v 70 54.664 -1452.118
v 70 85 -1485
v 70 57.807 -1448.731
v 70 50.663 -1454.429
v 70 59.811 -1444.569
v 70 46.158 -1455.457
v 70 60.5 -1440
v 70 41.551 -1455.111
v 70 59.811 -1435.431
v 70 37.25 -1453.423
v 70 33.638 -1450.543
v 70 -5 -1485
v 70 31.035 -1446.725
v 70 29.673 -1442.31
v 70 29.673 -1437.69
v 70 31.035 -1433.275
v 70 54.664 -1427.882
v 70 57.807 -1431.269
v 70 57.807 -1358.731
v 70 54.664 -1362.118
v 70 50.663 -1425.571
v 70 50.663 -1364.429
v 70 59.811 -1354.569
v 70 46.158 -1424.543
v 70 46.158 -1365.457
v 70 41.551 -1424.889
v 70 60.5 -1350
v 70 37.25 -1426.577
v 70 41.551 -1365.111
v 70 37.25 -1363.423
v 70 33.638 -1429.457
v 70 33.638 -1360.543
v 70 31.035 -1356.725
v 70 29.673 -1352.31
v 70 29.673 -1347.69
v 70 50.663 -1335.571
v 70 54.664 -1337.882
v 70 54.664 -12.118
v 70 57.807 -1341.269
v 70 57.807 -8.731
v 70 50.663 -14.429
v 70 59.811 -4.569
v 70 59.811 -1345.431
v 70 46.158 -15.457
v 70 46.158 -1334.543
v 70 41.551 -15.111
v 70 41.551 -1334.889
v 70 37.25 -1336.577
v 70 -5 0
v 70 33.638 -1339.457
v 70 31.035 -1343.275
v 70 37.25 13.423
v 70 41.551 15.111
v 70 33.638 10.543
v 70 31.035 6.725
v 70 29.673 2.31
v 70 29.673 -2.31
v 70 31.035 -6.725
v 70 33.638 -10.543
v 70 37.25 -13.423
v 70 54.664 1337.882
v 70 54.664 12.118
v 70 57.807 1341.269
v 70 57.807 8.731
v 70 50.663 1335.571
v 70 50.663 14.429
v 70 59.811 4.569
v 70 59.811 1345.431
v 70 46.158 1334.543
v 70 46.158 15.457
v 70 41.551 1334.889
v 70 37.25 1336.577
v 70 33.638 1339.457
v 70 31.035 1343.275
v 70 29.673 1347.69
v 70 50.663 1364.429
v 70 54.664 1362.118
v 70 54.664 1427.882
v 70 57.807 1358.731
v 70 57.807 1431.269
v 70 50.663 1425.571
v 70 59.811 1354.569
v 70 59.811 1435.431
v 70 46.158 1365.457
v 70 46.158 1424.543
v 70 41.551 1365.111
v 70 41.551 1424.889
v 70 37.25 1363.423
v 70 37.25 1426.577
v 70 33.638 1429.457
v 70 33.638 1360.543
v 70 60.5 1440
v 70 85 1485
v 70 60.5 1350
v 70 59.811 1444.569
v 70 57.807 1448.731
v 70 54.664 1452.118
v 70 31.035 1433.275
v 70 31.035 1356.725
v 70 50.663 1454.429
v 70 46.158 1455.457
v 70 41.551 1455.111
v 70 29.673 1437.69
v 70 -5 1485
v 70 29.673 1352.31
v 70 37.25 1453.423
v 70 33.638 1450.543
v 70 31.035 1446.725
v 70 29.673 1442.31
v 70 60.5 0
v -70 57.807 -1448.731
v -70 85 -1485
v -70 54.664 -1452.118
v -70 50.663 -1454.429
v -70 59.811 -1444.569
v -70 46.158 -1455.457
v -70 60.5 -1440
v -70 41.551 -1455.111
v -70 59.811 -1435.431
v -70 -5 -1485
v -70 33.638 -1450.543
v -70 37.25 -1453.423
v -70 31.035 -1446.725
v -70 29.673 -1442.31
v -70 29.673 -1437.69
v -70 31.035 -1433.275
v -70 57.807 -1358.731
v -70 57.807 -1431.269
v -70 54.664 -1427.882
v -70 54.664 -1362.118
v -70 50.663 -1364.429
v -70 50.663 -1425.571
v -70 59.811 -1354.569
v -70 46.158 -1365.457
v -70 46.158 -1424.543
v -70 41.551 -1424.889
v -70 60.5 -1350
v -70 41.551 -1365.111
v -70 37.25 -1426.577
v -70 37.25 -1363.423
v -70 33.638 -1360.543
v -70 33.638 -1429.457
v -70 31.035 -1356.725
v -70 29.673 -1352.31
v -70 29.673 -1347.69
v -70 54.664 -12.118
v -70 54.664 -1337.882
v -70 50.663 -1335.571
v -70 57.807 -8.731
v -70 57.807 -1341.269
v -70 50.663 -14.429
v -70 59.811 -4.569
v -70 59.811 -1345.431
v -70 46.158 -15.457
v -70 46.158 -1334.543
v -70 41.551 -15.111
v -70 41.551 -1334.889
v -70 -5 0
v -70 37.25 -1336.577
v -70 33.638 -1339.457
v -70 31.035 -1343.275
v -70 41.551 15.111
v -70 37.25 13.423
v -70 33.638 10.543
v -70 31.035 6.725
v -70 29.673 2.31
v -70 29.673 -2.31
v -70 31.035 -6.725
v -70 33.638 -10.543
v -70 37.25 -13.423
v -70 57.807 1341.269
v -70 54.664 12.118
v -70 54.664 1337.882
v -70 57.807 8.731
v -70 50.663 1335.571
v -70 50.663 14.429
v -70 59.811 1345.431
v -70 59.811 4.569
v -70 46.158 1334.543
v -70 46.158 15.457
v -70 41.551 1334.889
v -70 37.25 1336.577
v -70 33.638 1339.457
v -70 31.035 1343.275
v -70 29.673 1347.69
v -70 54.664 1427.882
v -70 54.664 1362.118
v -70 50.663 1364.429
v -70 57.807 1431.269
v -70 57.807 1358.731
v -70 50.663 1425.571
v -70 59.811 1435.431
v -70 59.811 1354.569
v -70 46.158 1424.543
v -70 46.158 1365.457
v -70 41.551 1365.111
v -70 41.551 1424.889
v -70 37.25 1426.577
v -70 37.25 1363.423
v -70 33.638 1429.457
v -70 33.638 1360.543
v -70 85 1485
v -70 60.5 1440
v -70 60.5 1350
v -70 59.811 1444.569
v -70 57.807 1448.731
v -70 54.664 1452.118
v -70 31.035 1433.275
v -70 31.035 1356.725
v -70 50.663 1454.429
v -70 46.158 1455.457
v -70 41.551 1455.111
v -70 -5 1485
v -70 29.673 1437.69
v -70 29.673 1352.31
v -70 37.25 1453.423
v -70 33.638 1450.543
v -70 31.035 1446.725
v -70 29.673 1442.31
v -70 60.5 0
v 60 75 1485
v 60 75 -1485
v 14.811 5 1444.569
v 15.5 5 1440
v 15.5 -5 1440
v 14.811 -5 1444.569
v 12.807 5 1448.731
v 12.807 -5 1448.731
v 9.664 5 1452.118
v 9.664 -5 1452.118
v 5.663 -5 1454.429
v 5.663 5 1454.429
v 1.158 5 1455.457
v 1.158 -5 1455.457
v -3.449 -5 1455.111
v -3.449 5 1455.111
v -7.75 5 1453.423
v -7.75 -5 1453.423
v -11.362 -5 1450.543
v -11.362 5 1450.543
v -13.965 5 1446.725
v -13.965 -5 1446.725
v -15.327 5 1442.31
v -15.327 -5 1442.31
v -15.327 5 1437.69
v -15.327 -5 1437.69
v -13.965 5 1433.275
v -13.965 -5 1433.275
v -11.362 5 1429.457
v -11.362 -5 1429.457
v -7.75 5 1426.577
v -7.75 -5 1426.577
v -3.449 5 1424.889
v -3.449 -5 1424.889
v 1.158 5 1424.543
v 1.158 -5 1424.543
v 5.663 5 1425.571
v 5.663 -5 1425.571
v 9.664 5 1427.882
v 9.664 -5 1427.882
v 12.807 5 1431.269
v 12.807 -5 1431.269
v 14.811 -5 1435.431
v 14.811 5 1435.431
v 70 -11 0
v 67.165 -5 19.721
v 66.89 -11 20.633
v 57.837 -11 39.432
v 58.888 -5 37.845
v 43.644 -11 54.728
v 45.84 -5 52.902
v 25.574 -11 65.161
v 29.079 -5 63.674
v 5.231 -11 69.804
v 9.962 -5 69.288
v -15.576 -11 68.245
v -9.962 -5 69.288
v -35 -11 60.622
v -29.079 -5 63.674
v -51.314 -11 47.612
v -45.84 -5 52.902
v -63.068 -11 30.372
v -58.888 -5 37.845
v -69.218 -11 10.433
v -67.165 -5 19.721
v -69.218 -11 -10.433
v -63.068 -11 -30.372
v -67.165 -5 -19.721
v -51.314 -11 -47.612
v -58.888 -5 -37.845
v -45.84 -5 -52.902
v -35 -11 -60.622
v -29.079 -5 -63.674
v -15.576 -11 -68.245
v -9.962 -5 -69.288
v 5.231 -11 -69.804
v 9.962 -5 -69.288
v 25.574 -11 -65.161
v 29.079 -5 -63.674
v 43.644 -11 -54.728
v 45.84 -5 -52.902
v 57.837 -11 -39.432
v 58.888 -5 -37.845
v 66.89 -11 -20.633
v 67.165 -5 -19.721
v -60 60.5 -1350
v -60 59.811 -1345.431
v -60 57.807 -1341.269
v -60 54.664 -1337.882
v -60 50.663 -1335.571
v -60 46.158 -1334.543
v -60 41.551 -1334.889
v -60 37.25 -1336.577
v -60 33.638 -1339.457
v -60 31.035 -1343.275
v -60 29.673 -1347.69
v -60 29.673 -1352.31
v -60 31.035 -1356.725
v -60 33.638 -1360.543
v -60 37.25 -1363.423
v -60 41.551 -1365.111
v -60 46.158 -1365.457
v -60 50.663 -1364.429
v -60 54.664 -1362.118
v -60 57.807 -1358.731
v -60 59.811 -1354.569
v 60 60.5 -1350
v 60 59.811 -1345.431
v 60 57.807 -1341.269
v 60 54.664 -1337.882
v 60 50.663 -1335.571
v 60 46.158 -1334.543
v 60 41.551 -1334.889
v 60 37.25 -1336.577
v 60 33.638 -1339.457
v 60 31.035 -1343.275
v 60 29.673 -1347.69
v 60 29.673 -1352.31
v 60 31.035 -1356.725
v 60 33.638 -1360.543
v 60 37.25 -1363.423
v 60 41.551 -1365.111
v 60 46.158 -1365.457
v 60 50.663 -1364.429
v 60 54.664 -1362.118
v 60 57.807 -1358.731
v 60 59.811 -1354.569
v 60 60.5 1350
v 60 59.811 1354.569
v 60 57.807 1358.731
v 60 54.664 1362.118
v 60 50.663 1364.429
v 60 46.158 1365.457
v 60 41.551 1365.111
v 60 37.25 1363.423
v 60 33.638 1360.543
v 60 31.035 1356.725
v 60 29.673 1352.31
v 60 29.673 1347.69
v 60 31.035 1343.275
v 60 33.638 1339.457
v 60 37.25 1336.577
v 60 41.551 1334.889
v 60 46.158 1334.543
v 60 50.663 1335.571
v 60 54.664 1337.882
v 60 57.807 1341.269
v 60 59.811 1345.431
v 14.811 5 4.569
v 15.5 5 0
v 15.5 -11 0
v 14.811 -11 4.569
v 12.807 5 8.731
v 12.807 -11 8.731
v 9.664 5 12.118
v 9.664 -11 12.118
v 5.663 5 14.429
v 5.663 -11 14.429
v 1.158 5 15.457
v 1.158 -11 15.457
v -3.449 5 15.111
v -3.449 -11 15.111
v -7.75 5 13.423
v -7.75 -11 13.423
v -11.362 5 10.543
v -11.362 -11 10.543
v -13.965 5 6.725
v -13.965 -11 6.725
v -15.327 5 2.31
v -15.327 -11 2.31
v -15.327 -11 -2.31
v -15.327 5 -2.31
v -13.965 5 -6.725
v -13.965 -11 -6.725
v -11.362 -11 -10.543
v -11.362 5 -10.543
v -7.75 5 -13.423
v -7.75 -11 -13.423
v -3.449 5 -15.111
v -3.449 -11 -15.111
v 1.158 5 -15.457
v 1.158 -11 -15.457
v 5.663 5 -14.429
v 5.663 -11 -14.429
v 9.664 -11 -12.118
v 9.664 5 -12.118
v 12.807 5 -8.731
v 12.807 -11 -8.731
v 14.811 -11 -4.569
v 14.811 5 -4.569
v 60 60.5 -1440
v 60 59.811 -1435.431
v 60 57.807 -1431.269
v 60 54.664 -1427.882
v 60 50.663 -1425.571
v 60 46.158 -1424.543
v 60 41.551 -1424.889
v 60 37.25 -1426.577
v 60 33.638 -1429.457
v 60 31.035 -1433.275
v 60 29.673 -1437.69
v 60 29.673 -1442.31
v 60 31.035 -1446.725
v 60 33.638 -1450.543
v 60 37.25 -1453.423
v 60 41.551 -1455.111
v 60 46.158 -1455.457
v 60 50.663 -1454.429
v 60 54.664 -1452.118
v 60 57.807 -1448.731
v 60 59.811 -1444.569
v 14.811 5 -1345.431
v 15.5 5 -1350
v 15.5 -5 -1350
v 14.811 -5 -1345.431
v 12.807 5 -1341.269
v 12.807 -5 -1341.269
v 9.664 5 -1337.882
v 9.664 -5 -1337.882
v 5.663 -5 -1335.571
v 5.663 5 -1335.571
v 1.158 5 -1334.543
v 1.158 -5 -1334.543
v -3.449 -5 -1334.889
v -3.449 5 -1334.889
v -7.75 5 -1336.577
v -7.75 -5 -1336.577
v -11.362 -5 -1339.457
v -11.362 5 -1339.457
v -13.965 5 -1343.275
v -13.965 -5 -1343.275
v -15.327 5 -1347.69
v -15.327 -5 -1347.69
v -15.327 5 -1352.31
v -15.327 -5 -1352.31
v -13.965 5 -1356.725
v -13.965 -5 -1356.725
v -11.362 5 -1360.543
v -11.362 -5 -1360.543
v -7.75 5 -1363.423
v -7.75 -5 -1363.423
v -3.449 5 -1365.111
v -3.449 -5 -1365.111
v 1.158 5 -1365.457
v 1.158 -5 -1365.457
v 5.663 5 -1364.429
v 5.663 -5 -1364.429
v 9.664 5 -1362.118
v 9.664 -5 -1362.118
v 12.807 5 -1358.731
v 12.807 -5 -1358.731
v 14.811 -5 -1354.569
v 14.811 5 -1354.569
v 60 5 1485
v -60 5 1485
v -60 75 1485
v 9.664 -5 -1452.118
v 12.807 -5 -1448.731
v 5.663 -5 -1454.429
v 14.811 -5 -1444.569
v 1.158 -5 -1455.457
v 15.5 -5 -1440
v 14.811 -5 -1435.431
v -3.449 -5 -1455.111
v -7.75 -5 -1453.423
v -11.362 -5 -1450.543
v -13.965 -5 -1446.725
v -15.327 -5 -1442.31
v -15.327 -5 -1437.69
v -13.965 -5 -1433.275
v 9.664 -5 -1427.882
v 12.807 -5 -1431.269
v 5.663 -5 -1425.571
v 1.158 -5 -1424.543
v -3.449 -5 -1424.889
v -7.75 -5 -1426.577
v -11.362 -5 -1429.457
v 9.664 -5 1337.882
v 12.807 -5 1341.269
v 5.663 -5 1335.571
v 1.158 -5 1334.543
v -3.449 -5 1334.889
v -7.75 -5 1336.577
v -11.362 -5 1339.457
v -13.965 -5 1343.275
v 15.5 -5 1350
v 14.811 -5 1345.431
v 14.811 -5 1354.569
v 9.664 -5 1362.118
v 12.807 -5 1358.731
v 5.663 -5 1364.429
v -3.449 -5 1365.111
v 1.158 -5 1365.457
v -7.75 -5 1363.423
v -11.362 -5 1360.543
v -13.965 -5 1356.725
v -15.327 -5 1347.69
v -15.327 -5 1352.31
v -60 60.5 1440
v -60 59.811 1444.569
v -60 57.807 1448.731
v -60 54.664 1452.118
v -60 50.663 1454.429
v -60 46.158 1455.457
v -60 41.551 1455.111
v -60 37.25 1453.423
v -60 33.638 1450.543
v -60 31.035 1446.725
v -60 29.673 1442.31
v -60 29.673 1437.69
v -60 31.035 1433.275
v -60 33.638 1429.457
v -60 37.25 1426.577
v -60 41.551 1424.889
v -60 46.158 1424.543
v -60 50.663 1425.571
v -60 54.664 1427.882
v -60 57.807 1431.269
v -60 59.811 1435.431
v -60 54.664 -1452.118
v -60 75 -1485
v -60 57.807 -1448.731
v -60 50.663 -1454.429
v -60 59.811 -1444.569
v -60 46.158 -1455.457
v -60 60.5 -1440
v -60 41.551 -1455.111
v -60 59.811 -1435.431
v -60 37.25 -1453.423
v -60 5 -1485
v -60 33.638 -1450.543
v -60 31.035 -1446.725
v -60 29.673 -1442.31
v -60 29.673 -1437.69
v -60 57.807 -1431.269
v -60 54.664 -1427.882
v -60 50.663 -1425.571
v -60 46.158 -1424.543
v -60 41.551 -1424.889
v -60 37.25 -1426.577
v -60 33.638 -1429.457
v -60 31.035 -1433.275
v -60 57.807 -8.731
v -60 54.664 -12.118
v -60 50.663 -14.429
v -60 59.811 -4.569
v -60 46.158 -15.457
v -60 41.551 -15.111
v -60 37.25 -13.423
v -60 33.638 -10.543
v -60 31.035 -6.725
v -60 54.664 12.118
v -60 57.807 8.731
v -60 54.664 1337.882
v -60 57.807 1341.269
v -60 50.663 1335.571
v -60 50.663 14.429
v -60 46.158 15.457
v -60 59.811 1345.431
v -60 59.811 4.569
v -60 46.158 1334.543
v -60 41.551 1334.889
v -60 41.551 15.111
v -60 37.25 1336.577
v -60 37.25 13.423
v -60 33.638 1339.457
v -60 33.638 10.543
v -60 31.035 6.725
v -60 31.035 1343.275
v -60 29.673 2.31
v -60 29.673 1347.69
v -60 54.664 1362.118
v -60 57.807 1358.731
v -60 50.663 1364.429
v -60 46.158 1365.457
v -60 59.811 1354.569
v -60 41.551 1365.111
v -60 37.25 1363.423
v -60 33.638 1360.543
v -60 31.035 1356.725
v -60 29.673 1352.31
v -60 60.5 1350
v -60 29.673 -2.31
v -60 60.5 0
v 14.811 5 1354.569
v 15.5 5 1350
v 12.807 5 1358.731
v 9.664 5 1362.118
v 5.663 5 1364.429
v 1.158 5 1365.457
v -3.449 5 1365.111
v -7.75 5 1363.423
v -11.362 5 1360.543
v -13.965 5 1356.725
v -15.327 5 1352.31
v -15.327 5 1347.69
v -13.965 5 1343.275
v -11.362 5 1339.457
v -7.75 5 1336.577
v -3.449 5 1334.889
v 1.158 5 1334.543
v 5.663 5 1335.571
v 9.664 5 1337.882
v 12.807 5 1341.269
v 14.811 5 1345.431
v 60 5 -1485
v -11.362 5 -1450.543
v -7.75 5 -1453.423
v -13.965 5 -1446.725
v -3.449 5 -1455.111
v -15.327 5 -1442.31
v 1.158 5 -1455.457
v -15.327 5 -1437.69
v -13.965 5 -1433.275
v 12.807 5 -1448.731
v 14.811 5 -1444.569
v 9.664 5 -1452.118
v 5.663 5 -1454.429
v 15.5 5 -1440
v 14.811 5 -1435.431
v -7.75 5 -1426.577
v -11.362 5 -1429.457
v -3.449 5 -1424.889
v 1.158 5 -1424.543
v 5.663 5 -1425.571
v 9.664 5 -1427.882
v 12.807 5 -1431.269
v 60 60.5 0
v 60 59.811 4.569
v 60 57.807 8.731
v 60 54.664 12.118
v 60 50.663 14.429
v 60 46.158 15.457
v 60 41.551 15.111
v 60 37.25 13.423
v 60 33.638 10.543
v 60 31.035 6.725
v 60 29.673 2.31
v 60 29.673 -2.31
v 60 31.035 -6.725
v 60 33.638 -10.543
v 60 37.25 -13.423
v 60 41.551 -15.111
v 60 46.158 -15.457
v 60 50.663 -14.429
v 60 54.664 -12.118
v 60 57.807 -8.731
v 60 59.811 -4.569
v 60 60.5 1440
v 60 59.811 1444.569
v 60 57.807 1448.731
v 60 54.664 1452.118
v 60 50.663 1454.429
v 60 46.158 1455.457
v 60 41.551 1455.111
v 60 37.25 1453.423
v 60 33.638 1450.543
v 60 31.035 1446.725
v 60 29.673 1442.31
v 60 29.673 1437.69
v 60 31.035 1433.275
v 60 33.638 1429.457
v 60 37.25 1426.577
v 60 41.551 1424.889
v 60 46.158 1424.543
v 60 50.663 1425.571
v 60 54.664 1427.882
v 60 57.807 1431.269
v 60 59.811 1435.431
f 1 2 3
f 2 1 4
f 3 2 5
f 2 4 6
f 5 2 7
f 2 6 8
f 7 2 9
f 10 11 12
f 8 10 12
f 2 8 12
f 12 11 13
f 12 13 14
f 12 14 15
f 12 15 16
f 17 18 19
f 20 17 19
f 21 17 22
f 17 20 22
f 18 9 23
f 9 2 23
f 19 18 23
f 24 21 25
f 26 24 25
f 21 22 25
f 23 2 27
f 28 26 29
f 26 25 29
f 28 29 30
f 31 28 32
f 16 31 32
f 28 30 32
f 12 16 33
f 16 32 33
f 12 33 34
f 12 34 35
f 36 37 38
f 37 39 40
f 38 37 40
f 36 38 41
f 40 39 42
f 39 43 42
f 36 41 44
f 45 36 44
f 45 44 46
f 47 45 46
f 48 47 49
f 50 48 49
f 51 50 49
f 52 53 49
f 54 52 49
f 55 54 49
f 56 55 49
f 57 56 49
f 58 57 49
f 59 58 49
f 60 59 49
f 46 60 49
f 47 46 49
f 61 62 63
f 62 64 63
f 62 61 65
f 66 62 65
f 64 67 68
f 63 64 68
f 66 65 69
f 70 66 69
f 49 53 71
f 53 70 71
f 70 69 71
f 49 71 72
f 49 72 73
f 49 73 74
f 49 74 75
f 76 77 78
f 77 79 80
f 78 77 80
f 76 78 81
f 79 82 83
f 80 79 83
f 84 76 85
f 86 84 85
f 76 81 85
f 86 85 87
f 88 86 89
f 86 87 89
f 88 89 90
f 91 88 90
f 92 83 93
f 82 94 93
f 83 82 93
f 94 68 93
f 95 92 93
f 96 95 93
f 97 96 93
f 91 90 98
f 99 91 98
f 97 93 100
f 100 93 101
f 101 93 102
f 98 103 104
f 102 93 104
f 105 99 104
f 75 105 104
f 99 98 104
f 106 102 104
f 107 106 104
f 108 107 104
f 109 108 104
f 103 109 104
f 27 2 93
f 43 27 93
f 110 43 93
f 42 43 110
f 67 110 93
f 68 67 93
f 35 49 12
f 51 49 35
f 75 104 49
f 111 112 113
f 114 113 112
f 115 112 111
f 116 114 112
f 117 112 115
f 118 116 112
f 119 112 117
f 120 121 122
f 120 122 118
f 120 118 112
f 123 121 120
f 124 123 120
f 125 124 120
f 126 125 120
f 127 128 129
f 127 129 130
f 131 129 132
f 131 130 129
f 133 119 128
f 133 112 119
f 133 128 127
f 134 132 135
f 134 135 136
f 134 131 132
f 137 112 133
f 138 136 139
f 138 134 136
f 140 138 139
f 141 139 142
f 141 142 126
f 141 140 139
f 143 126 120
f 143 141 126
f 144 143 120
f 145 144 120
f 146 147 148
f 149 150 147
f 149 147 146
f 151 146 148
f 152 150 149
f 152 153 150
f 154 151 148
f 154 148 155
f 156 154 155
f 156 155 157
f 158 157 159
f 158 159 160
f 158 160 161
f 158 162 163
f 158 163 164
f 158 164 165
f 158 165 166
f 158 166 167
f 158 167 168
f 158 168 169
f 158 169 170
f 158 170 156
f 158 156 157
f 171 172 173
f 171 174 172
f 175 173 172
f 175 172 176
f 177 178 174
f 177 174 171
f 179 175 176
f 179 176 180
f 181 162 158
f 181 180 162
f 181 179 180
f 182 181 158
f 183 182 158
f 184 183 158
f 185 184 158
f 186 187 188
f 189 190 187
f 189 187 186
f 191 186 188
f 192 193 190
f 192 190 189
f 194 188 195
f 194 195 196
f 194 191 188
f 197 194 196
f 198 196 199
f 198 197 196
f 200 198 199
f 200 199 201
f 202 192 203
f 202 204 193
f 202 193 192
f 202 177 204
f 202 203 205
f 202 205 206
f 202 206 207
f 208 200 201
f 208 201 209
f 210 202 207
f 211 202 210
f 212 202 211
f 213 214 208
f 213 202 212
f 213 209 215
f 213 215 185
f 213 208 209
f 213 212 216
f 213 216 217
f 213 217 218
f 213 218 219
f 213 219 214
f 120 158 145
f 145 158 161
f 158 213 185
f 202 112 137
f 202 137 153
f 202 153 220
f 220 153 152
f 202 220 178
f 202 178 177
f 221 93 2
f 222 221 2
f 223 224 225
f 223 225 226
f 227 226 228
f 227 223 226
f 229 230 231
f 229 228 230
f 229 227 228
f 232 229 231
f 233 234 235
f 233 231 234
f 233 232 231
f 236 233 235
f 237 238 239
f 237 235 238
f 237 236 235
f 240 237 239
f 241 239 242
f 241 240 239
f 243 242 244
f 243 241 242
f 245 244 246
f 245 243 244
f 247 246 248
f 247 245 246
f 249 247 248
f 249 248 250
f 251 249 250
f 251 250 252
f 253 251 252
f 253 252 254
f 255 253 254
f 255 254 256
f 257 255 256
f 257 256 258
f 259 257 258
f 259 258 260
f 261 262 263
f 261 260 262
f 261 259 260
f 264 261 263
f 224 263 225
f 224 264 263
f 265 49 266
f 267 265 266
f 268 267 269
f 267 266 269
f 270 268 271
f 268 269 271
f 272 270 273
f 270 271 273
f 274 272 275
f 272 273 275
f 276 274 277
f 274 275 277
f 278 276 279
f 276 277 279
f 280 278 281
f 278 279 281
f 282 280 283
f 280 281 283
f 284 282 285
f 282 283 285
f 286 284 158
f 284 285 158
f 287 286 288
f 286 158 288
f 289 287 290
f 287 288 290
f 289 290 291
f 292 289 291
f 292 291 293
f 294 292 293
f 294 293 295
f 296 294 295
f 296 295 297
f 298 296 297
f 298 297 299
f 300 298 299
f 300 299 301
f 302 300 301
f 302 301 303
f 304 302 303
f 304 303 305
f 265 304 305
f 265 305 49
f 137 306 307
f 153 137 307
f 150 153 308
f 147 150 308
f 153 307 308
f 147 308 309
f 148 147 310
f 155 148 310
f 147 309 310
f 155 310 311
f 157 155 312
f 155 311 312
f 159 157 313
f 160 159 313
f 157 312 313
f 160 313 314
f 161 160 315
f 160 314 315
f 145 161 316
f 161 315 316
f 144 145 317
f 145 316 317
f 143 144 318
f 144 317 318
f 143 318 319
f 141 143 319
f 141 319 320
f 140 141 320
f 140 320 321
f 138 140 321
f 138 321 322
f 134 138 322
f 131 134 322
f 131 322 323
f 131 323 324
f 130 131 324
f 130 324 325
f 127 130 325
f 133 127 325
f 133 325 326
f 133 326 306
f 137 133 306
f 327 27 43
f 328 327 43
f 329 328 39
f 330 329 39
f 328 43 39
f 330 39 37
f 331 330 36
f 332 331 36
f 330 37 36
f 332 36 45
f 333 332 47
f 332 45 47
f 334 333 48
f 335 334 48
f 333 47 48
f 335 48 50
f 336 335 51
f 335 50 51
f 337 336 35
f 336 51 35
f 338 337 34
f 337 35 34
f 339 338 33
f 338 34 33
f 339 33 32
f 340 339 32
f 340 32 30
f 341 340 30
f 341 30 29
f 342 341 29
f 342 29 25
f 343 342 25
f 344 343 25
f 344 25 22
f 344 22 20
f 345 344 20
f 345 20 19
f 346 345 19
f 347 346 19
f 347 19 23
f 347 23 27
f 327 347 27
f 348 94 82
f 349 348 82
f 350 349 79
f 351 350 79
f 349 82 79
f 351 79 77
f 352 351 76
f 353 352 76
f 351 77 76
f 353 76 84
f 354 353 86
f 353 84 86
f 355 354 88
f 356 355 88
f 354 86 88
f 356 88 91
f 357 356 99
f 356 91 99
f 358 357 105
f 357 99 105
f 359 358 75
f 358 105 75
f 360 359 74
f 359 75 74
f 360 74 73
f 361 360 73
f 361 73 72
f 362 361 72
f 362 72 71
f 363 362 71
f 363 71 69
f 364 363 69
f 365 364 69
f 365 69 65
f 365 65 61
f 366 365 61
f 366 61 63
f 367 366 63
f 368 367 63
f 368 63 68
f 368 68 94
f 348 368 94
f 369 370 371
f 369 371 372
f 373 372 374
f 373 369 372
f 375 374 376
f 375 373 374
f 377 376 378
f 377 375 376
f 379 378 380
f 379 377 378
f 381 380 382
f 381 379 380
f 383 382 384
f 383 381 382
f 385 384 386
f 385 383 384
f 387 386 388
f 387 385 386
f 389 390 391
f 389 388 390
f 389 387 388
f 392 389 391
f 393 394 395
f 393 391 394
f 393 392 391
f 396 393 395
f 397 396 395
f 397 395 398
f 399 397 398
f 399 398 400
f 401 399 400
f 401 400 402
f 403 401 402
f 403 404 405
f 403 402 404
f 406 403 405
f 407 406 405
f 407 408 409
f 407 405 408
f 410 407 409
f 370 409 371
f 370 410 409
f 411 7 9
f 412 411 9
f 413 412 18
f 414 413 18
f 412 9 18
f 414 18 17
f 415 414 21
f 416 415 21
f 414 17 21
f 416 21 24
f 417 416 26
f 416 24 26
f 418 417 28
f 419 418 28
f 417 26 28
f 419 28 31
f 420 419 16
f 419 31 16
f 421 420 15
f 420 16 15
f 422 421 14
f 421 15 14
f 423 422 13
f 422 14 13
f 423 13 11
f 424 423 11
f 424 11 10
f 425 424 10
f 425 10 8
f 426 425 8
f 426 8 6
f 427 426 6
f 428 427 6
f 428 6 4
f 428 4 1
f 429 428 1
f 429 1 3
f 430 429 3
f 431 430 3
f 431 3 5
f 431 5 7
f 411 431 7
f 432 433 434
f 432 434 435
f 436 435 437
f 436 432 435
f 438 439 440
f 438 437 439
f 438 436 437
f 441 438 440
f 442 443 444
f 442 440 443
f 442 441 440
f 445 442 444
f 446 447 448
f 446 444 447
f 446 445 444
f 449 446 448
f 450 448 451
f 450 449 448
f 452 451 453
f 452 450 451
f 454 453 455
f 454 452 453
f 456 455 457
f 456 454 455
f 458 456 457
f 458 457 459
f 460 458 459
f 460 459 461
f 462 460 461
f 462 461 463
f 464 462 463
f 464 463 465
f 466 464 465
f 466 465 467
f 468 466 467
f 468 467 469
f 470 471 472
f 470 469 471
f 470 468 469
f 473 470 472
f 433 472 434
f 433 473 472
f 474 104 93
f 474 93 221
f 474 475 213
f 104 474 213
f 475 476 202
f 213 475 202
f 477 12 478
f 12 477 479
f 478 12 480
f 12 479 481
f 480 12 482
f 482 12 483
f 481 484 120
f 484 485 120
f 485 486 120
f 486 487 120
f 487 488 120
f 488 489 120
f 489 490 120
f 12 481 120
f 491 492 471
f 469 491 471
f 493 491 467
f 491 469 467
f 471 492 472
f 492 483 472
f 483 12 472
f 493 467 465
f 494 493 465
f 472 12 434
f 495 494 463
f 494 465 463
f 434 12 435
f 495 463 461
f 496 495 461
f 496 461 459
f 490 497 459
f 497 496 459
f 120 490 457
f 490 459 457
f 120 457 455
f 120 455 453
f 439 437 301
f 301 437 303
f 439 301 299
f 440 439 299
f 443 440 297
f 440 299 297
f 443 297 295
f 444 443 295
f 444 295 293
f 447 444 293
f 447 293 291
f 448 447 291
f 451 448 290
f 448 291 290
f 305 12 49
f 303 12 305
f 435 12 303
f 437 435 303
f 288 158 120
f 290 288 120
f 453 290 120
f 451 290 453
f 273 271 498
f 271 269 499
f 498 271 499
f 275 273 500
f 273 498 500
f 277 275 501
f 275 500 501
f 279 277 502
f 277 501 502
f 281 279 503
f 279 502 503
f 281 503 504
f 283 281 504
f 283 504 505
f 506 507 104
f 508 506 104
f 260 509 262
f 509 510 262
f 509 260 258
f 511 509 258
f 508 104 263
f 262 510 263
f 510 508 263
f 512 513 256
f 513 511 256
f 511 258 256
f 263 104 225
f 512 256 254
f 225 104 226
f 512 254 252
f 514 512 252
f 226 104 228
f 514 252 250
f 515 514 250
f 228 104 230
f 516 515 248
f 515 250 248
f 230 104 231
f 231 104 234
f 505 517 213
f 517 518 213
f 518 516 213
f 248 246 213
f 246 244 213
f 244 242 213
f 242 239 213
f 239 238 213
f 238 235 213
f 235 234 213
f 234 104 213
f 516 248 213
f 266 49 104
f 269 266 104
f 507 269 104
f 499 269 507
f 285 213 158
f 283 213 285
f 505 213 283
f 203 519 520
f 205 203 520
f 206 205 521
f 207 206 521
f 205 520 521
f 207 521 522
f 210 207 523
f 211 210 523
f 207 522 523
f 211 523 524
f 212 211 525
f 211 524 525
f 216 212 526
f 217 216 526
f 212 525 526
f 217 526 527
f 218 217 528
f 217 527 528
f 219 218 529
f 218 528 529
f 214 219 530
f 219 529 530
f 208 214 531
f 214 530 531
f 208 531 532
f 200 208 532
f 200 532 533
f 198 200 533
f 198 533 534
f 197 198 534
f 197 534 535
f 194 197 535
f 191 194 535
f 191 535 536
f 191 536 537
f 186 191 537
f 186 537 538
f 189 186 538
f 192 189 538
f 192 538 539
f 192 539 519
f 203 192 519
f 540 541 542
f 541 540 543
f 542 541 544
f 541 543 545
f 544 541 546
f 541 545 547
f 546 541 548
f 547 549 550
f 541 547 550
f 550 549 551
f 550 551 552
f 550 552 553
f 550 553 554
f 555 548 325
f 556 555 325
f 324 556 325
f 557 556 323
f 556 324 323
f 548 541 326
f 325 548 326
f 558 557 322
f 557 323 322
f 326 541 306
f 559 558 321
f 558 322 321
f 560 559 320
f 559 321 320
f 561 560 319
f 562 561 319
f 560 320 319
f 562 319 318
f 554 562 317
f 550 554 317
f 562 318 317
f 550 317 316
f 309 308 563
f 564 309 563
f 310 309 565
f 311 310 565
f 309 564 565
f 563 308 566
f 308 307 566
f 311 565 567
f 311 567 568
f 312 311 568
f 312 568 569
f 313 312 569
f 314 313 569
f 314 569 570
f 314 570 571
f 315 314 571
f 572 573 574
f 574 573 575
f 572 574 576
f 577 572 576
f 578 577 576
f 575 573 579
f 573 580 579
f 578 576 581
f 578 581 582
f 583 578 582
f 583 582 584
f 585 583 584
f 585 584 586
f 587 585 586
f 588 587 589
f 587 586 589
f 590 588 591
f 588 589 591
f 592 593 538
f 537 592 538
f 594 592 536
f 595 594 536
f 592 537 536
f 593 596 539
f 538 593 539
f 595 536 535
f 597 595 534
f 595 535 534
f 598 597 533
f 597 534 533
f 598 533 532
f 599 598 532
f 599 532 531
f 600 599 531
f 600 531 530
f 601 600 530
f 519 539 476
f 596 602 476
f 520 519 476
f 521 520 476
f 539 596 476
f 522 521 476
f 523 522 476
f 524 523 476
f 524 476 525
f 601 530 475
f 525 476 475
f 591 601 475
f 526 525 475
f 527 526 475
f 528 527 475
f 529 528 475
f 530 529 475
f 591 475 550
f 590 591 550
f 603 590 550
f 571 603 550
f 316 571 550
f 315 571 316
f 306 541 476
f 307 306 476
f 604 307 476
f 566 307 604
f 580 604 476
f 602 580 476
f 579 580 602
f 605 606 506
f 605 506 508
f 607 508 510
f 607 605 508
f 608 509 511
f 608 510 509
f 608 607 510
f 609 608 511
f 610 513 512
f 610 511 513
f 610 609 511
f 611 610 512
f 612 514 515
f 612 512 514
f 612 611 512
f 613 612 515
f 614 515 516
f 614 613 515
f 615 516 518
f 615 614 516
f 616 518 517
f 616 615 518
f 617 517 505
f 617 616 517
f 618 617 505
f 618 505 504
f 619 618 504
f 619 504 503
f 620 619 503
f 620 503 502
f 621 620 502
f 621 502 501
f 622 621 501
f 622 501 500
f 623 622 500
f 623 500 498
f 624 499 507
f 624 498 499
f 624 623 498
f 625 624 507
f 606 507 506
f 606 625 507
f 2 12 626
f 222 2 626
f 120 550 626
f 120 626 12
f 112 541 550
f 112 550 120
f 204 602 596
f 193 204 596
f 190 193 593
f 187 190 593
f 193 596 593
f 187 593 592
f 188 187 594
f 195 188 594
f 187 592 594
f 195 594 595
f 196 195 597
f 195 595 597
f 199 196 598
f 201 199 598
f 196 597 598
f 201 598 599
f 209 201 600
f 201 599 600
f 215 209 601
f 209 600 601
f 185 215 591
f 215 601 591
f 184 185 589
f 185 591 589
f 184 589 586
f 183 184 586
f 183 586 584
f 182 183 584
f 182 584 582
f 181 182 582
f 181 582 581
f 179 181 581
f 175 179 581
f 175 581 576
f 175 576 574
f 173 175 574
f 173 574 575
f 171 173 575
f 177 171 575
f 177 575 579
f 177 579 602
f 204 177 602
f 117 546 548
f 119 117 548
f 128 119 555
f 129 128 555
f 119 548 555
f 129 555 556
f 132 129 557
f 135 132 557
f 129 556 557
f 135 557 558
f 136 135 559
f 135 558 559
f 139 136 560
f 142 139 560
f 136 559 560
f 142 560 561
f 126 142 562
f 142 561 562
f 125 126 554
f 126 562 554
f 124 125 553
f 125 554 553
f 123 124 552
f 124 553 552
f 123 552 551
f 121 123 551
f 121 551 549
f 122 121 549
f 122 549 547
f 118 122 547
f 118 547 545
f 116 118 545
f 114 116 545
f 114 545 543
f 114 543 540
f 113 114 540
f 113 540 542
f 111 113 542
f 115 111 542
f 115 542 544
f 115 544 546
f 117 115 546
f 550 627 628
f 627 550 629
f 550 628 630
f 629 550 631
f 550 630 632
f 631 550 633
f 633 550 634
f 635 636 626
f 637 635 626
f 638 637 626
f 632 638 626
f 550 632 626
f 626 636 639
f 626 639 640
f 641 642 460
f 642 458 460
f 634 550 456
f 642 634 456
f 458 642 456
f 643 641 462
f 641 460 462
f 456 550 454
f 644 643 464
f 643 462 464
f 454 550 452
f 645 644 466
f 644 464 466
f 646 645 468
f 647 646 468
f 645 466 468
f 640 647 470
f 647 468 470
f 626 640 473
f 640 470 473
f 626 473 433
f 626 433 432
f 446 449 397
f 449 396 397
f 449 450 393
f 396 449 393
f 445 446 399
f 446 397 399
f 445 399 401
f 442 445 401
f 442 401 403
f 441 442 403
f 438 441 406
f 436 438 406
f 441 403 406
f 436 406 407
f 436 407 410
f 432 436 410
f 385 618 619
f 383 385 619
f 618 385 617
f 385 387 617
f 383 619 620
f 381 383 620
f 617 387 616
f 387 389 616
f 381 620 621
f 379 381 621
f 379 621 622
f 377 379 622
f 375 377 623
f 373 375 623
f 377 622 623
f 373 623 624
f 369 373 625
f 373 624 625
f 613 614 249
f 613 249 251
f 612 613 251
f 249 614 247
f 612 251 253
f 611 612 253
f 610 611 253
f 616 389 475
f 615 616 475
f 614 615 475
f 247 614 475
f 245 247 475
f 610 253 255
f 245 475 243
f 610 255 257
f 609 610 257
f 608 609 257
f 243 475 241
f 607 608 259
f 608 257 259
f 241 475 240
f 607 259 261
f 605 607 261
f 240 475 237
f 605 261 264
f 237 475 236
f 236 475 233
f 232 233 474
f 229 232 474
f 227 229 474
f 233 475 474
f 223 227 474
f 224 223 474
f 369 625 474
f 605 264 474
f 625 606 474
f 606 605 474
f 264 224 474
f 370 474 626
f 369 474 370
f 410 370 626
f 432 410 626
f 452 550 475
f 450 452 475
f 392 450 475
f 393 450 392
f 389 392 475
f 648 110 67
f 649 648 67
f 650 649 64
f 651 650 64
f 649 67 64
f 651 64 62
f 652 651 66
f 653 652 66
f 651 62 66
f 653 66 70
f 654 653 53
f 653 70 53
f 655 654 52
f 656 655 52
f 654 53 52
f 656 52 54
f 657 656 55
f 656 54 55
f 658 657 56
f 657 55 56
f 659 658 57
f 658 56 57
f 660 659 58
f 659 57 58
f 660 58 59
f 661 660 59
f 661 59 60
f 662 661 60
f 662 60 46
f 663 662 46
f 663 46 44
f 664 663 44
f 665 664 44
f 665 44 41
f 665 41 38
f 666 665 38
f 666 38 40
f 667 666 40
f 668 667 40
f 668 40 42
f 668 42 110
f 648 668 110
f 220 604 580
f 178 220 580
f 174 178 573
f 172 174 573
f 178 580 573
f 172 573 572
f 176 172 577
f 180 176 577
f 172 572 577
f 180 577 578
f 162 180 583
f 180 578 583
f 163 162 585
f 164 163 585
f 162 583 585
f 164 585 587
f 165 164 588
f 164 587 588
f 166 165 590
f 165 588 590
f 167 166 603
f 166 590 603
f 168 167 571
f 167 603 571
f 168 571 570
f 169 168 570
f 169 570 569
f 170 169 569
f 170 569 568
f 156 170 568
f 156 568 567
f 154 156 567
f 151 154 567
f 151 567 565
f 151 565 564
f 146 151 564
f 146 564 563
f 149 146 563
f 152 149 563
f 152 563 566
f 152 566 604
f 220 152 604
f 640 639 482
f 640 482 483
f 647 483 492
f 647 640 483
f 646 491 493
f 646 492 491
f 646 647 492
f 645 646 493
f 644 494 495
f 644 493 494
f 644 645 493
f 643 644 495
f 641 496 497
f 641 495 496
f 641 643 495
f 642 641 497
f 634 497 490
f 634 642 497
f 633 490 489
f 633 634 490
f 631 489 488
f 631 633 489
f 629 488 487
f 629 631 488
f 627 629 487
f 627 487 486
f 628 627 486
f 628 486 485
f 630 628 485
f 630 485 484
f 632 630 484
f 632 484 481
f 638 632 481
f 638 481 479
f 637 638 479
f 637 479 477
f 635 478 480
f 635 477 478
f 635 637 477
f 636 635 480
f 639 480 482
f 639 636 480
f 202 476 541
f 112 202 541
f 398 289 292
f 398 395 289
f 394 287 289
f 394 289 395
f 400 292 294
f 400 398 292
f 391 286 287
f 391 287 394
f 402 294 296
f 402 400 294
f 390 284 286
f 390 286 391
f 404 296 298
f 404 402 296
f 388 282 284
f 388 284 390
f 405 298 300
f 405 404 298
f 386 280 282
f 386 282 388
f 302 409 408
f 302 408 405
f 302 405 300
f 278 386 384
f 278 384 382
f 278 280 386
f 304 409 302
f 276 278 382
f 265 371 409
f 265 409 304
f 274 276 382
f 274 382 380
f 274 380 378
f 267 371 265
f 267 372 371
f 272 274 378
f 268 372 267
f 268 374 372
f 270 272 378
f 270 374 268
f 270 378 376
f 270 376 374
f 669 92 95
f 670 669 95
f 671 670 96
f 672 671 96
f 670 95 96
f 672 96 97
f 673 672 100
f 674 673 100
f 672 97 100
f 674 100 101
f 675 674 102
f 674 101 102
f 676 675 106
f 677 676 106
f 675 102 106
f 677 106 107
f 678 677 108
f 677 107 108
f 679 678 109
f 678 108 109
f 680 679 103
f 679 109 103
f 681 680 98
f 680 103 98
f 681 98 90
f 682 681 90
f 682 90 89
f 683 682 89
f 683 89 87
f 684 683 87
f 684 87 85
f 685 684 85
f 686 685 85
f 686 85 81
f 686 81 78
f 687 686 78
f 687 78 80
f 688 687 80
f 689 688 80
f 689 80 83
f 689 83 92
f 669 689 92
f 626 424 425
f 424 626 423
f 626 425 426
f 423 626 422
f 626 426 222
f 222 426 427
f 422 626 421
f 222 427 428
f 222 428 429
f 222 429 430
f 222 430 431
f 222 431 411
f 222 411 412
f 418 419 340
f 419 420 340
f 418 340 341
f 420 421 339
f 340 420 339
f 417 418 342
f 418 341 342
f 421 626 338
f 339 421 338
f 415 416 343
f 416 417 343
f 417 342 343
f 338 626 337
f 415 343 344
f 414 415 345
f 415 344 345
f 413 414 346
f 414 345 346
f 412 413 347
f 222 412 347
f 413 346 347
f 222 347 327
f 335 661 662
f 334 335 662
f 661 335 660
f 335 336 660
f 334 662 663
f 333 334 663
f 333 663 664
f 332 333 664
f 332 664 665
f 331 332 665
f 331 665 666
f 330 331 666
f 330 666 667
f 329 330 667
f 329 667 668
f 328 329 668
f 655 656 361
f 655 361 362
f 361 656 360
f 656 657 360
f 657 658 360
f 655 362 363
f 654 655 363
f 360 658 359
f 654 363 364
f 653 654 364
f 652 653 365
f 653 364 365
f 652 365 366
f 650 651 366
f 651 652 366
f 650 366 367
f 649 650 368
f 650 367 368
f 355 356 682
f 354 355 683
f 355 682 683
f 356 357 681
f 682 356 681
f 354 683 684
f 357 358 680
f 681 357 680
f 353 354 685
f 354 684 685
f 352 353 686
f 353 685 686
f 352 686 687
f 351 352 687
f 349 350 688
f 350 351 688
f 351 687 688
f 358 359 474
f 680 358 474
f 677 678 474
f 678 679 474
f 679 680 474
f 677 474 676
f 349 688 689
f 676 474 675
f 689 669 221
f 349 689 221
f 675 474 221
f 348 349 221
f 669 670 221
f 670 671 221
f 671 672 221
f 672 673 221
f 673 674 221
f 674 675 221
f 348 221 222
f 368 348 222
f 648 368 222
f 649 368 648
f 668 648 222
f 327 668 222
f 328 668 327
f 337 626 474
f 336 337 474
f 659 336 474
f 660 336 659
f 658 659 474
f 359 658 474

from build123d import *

# Parameters (mm, degrees)
EXTRUDE_1_DEPTH          = 1485
CHAMFER_1_SIZE           = 10
SKETCH_2_R               = 15.5
CUT_EXTRUDE_2_DEPTH      = 1495.004685401
SKETCH_4_R               = 70
EXTRUDE_4_DEPTH          = 6
CUT_EXTRUDE_3_DEPTH      = 1490.370672465
CUT_EXTRUDE_3_DEPTH_BACK = 1490.370672465
SKETCH_3_R               = 15.5


with BuildPart() as part:
    # 草图1 → 拉伸1 (new, symmetric)
    with BuildSketch(Plane.XY):
        Polygon((-70, 0), (-70, 85), (-60, 85), (-60, 5), (60, 5), (60, 85), (70, 85), (70, -5), (-70, -5), align=None)
    extrude(amount=EXTRUDE_1_DEPTH, both=True)

    # 倒角1
    chamfer_1_edges = [part.edges().sort_by_distance(p)[0] for p in [
        (60, 85, 0),
        (-60, 85, 0),
    ]]
    chamfer(chamfer_1_edges, length=CHAMFER_1_SIZE - 0.0001)  # a hair under: the kernel refuses the full size

    # 草图2 → 拉伸2 (cut, through all)
    with BuildSketch(Plane(origin=(70, 0, 0), x_dir=(0, 0, -1), z_dir=(1, 0, 0))):
        with Locations(Location((-1440, 45, 0), (0, 0, 90))):
            Circle(SKETCH_2_R)
        with Locations(Location((-1350, 45, 0), (0, 0, 90))):
            Circle(SKETCH_2_R)
        with Locations(Location((0, 45, 0), (0, 0, 90))):
            Circle(SKETCH_2_R)
        with Locations(Location((1350, 45, 0), (0, 0, 90))):
            Circle(SKETCH_2_R)
        with Locations(Location((1440, 45, 0), (0, 0, 90))):
            Circle(SKETCH_2_R)
    extrude(amount=-CUT_EXTRUDE_2_DEPTH, mode=Mode.SUBTRACT)

    # 草图4 → 拉伸4 (add)
    with BuildSketch(Plane.XZ.offset(5)):
        Circle(SKETCH_4_R)
    extrude(amount=EXTRUDE_4_DEPTH)

    # 草图3 → 拉伸3 (cut, two sides: drawn at the far end of the back side and taken through both)
    with BuildSketch(Plane.XZ.offset(5).offset(-CUT_EXTRUDE_3_DEPTH_BACK)):
        with Locations((0, -1440)):
            Circle(SKETCH_3_R)
        Circle(SKETCH_3_R)
        with Locations((0, -1350)):
            Circle(SKETCH_3_R)
        with Locations((0, 1350)):
            Circle(SKETCH_3_R)
        with Locations((0, 1440)):
            Circle(SKETCH_3_R)
    extrude(amount=CUT_EXTRUDE_3_DEPTH + CUT_EXTRUDE_3_DEPTH_BACK, mode=Mode.SUBTRACT)


solid = part.part
